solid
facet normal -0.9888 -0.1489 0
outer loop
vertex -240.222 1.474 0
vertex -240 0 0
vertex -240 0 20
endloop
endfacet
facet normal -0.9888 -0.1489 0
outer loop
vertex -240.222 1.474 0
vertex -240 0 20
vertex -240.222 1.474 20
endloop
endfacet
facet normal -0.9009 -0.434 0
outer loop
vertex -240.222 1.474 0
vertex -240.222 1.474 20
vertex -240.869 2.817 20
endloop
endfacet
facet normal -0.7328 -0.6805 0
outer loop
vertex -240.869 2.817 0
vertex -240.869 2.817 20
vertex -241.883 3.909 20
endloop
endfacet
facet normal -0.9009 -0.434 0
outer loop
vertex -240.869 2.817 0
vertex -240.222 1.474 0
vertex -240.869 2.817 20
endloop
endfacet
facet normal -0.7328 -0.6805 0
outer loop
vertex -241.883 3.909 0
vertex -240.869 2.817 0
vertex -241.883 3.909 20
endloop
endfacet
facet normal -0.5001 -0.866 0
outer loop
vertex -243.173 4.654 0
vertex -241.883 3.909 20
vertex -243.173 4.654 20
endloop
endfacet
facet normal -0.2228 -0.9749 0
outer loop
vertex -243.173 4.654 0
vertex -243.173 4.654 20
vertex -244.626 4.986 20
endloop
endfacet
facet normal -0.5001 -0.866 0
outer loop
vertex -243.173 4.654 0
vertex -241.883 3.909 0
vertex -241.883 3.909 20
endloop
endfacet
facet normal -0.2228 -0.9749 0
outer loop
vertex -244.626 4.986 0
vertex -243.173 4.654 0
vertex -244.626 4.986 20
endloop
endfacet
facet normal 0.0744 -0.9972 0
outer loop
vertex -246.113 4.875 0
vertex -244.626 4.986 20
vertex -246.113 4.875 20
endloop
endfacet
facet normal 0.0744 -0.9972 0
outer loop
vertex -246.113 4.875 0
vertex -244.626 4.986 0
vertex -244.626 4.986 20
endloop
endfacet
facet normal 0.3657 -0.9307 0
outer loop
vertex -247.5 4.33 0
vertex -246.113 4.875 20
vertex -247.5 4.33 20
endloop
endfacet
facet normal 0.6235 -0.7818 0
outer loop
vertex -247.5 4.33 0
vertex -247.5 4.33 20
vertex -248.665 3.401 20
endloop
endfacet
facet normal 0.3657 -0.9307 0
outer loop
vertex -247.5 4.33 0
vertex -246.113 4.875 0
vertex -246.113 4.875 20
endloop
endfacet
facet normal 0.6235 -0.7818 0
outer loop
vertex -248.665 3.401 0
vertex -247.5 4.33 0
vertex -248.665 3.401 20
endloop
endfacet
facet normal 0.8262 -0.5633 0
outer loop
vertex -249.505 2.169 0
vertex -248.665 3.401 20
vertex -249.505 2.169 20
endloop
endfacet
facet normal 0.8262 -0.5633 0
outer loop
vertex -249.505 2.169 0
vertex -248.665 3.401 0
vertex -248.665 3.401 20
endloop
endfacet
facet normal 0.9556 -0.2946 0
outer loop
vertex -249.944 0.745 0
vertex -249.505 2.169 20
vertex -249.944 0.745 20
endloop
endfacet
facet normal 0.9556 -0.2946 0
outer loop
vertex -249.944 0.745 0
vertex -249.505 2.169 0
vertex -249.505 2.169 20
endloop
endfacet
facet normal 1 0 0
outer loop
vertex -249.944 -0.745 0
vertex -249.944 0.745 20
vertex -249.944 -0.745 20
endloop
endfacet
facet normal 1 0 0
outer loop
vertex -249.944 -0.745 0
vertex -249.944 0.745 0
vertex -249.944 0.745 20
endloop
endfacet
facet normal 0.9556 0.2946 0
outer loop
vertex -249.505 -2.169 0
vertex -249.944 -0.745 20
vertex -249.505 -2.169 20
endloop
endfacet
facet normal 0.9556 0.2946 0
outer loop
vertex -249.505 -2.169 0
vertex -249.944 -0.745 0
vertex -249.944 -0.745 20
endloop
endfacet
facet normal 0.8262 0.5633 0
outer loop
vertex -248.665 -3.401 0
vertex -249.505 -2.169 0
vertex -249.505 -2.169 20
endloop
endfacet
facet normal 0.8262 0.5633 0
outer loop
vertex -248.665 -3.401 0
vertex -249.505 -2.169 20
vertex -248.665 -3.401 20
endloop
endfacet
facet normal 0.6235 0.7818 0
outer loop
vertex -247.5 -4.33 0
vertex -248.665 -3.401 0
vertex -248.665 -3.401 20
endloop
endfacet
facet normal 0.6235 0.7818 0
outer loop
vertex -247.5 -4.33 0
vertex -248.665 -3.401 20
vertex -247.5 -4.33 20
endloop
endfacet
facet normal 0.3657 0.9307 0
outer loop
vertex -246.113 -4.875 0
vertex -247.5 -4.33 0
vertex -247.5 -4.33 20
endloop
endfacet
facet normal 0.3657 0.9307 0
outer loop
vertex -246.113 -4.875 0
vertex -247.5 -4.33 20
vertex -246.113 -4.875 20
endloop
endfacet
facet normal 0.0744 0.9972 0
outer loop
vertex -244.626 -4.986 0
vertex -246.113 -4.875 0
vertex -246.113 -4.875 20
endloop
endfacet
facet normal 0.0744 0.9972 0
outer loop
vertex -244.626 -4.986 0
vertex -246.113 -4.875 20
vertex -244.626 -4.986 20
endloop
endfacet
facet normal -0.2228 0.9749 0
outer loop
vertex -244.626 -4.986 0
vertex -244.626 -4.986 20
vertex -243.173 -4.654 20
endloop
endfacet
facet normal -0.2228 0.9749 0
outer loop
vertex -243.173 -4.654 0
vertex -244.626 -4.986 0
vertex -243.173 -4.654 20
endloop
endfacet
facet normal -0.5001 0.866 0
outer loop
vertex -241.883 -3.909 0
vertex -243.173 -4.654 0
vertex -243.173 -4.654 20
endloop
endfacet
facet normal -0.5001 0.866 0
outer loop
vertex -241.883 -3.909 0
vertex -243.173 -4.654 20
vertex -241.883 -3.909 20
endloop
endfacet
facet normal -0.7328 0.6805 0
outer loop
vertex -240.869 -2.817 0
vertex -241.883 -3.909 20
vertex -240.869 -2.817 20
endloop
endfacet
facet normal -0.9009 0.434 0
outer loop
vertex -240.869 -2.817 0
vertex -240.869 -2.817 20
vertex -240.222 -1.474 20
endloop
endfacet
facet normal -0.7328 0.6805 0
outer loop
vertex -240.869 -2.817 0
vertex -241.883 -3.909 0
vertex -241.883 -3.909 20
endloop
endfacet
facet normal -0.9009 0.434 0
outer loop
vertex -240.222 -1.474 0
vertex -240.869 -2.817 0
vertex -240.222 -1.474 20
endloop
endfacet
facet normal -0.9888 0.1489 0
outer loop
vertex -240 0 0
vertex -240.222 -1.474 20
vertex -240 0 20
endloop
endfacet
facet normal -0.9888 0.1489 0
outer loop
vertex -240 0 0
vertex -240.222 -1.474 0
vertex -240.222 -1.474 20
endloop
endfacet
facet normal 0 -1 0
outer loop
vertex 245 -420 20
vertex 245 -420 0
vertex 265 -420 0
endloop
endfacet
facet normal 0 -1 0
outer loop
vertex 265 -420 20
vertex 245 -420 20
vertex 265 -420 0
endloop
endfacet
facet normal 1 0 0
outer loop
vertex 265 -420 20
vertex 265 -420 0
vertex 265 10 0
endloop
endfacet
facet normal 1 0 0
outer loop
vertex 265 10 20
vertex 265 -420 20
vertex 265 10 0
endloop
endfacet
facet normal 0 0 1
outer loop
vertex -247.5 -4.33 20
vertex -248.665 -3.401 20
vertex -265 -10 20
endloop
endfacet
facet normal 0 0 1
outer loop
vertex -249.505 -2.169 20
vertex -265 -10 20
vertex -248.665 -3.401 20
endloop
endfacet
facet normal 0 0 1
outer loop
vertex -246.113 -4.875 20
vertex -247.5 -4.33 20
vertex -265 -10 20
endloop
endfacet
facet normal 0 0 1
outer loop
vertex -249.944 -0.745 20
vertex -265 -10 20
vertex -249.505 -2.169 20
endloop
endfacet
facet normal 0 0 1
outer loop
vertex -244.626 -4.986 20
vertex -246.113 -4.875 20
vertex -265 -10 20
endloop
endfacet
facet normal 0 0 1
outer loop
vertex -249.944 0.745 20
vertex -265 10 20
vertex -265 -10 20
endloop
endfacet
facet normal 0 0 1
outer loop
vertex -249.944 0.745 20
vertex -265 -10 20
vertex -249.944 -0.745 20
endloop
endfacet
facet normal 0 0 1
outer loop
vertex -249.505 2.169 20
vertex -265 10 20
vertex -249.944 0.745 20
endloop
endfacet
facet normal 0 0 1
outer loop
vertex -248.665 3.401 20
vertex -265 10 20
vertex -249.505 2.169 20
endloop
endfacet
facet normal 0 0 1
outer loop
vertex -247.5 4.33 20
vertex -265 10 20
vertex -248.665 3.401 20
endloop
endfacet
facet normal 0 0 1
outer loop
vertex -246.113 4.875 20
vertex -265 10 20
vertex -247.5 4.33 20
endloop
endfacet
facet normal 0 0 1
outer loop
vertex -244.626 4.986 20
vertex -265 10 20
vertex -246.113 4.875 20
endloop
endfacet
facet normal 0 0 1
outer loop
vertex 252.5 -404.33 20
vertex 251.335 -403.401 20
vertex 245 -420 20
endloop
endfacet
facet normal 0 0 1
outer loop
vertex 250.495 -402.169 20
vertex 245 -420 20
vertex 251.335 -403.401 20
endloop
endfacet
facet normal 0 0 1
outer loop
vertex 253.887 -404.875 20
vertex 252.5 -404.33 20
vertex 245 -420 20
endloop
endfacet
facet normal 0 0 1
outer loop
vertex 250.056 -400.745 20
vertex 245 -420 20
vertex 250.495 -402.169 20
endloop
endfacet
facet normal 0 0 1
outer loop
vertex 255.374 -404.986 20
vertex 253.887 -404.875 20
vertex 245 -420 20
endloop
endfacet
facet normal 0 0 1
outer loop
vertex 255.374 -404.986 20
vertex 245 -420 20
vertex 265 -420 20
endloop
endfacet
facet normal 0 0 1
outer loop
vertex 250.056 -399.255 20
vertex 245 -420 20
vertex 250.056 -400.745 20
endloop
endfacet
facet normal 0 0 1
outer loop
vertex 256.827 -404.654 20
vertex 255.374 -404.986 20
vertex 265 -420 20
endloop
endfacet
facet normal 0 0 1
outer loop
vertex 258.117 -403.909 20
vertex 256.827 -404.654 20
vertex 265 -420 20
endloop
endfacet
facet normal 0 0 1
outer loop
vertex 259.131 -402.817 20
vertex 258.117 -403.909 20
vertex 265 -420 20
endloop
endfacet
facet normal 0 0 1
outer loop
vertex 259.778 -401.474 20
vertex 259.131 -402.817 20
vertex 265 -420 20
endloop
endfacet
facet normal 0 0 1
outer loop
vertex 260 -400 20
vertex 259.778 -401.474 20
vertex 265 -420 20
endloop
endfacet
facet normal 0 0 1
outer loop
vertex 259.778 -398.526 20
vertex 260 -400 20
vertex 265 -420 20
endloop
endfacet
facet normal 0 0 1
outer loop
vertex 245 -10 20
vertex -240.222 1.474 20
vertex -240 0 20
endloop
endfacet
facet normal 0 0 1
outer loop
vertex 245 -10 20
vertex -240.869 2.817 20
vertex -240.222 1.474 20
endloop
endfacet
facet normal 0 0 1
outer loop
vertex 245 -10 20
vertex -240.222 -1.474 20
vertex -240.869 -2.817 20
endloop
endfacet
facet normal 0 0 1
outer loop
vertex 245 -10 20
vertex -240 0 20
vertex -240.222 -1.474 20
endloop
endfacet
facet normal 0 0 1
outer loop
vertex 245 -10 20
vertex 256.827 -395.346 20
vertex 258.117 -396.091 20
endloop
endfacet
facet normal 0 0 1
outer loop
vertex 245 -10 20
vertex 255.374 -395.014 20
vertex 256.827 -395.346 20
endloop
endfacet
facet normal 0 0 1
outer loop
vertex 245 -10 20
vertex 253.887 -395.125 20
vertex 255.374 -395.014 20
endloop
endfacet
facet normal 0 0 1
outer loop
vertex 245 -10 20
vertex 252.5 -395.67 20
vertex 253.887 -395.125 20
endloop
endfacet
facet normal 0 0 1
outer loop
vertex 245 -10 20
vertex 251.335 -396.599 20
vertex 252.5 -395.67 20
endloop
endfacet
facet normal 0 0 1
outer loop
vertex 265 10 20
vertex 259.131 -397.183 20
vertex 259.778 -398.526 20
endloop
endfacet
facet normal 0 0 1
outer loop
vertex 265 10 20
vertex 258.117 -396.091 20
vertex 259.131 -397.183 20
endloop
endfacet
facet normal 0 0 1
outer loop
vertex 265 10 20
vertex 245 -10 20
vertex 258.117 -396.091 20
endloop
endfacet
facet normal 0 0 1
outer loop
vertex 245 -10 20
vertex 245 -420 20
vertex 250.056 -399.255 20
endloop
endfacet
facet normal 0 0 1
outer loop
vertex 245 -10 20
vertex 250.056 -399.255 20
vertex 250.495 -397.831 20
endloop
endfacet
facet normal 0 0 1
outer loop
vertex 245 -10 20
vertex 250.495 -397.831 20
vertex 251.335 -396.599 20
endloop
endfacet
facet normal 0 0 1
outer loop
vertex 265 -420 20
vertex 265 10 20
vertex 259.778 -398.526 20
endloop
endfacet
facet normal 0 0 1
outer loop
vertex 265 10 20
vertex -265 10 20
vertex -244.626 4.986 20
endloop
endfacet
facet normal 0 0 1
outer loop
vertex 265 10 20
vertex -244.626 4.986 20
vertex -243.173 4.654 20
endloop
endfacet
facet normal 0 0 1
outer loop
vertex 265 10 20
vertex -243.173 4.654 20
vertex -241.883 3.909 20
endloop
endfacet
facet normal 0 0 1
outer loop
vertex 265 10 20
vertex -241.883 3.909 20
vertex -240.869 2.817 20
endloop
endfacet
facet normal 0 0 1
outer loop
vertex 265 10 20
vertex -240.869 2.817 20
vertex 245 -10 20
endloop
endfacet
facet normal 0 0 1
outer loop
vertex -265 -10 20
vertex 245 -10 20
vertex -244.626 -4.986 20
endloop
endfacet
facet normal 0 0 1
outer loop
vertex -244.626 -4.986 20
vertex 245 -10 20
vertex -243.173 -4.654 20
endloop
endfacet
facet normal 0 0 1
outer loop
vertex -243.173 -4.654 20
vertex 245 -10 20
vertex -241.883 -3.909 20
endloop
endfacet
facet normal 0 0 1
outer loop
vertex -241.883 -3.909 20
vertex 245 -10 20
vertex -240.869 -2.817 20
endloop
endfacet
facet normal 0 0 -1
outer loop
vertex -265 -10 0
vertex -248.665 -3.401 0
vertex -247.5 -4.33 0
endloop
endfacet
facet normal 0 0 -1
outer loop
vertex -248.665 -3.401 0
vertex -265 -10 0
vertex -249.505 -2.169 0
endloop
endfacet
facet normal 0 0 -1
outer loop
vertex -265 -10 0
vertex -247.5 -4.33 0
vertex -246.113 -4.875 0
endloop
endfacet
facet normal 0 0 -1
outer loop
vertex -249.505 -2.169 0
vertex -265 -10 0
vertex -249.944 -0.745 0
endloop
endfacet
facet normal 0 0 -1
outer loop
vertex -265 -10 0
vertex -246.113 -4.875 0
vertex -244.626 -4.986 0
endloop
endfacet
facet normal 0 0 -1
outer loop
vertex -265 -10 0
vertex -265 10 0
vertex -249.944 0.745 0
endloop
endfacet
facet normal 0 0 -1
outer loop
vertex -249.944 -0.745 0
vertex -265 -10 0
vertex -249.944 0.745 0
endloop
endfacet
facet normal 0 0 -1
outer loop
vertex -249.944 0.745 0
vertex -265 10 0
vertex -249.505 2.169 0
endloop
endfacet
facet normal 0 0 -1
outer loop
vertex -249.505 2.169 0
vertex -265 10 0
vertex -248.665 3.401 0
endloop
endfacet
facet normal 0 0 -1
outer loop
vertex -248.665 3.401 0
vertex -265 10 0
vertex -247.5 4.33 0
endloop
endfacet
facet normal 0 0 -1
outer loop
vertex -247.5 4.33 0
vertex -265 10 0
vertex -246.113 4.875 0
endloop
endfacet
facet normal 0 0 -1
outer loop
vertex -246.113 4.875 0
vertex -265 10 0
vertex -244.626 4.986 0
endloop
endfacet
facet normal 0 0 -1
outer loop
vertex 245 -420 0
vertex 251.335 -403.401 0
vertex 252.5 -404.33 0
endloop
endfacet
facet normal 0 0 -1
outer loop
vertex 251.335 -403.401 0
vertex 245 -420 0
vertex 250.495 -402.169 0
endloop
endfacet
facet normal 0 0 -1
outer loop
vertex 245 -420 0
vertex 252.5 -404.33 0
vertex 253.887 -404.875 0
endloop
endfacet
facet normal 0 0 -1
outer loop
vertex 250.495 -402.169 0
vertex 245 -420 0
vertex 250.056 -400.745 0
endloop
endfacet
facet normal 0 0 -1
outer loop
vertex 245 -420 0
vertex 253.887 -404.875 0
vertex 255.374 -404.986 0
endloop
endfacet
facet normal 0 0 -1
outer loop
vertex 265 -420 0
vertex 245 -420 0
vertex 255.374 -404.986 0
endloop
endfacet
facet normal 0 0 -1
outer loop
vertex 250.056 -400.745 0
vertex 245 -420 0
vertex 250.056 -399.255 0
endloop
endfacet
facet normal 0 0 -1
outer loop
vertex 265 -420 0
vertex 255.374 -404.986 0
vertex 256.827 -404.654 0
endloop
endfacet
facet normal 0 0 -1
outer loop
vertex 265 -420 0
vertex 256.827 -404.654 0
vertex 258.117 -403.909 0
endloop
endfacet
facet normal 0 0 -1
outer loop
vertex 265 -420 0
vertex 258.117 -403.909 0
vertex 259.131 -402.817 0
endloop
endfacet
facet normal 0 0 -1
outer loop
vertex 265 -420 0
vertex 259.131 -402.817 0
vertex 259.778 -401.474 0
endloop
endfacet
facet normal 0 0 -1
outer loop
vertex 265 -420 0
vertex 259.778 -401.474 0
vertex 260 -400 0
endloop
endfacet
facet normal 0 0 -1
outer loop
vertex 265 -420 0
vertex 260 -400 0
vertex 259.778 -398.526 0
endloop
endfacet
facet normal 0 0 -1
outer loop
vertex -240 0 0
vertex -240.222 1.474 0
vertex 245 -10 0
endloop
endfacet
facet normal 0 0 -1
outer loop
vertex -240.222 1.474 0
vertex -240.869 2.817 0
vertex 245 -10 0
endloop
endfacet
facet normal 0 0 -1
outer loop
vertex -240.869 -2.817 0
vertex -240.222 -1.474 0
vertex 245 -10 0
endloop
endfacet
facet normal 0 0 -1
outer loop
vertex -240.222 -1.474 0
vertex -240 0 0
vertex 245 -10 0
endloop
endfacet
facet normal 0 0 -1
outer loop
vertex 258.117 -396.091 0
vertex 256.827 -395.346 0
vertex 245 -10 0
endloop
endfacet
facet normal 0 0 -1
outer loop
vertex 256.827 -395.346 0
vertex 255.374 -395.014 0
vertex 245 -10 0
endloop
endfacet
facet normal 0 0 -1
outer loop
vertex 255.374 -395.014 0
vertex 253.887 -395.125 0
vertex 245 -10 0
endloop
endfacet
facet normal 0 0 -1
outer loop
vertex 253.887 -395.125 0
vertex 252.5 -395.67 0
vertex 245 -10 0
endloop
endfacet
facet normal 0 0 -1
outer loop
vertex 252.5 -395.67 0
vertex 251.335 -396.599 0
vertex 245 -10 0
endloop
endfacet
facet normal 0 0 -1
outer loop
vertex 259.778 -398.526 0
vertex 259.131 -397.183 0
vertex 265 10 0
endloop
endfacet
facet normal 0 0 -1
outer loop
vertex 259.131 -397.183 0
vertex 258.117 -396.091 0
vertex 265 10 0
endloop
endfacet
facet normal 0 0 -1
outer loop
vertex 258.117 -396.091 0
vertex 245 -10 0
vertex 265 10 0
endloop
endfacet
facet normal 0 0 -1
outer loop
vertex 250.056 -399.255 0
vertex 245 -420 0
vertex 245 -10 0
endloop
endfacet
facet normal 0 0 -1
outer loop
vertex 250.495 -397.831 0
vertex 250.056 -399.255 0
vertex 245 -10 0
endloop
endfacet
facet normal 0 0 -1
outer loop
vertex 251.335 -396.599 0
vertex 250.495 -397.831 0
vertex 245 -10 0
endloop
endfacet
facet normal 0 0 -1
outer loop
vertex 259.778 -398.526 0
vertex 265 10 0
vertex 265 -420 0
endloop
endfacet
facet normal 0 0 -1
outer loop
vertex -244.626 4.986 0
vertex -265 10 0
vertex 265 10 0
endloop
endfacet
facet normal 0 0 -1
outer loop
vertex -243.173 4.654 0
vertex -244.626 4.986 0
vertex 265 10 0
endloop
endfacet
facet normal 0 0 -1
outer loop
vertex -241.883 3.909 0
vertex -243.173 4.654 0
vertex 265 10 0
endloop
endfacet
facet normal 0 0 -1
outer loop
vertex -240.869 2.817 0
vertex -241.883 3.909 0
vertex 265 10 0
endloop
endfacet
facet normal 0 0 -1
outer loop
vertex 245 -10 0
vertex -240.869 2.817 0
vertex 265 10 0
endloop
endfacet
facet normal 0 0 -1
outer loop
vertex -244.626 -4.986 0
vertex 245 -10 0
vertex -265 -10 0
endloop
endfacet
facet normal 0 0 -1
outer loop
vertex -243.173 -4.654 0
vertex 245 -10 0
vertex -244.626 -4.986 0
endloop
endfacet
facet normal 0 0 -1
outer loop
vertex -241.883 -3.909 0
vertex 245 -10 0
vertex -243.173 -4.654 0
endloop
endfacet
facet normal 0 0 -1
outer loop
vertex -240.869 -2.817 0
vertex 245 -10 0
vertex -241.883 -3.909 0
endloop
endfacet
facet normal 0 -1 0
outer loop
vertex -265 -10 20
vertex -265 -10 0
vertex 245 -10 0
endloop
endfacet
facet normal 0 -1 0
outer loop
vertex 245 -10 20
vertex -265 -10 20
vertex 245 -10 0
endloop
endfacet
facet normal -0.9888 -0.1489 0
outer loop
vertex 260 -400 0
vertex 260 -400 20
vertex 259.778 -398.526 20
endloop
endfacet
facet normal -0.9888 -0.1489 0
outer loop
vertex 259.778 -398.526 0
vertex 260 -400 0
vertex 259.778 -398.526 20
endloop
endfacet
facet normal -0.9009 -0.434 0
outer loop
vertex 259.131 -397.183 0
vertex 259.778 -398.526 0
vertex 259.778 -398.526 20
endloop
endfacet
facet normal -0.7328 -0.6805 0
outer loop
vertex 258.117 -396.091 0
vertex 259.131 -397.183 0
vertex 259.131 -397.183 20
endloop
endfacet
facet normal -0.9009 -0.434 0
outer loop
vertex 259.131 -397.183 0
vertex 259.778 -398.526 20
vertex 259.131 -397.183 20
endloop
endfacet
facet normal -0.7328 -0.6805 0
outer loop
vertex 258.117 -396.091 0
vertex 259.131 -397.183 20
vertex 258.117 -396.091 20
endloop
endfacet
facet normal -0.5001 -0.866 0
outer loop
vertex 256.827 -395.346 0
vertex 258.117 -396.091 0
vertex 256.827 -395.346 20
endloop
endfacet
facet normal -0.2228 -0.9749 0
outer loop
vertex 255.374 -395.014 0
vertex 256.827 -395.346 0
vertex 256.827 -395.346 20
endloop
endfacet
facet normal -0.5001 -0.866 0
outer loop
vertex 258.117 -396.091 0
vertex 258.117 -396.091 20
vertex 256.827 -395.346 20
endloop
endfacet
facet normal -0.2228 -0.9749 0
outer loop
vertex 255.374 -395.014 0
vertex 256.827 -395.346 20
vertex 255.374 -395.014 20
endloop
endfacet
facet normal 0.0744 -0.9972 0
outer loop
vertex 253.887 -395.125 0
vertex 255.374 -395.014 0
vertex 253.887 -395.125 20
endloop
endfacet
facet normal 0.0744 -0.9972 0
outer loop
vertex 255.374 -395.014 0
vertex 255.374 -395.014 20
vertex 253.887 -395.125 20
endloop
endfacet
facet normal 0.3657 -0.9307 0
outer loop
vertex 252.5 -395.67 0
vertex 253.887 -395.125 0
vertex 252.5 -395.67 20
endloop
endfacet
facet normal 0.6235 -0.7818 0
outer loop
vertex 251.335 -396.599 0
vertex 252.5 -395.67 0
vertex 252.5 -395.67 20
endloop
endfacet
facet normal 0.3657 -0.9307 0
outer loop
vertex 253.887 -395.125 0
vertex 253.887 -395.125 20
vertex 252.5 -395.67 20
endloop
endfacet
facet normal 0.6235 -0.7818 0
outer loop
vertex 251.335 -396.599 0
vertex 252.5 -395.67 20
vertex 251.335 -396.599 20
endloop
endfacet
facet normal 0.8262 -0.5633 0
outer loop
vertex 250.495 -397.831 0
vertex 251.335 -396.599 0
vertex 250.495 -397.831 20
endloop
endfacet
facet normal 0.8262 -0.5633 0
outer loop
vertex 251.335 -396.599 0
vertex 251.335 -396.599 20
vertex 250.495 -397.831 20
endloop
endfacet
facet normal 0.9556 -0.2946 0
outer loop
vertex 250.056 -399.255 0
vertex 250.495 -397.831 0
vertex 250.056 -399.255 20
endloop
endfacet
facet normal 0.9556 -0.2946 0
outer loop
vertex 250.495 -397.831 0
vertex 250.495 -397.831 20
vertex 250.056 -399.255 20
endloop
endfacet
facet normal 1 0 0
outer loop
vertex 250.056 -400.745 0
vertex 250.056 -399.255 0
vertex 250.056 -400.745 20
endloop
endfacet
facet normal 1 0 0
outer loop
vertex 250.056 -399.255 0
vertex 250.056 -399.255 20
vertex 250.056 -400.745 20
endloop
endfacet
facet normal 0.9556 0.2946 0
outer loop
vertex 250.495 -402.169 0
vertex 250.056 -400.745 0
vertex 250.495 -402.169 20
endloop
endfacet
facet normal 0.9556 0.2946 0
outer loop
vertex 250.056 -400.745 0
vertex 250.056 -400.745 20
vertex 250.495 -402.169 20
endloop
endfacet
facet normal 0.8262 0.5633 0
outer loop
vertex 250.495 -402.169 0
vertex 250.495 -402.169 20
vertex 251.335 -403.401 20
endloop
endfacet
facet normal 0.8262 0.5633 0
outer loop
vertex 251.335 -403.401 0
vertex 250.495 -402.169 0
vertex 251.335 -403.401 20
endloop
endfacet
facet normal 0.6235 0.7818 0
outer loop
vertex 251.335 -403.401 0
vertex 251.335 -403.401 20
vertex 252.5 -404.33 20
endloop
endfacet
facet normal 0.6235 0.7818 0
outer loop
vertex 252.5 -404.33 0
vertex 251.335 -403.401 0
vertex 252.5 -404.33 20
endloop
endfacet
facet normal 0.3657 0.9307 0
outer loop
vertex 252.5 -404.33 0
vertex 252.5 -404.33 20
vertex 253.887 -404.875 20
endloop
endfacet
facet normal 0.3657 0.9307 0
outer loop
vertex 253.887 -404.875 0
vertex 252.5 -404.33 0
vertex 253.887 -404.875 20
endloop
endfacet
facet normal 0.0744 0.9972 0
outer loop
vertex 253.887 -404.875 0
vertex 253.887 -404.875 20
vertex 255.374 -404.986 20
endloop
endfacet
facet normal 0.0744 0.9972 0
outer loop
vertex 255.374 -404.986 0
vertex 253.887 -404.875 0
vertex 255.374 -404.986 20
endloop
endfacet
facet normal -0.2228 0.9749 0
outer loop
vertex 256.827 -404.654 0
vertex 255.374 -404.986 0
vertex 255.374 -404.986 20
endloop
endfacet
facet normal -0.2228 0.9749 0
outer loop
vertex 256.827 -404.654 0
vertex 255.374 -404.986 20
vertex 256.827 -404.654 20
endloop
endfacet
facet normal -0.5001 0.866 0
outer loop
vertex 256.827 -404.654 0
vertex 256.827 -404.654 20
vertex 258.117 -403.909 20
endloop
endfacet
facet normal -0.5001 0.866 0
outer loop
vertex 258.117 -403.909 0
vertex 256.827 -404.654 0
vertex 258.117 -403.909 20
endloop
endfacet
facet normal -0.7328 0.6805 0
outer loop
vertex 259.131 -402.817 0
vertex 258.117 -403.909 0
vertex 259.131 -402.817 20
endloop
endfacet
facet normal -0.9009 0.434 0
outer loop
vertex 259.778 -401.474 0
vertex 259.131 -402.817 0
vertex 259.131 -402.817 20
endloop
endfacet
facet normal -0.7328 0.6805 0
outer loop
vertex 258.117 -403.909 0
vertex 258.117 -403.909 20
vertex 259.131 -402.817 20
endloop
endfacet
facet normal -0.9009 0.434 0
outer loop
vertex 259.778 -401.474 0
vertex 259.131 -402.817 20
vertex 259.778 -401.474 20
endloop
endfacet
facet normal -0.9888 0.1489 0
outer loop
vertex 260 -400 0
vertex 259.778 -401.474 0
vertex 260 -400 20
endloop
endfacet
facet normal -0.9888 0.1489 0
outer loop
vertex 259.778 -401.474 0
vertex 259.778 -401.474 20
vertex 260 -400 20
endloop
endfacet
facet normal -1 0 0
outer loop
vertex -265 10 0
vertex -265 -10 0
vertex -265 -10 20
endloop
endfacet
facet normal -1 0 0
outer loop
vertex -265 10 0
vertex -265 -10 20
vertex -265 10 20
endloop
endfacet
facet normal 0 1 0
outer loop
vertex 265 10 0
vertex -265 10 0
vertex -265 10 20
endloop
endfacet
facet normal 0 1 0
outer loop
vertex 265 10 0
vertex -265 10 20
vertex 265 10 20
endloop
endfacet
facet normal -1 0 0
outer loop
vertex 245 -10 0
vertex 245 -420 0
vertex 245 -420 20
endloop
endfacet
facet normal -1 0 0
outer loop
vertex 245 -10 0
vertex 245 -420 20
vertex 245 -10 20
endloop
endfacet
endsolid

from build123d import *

# Parameters (mm, degrees)
SKETCH_1_W          = 510
SKETCH_1_H          = 20
SKETCH_1_R          = 5
SKETCH_1_W_2        = 20
SKETCH_1_H_2        = 410
EXTRUDE_1_DEPTH     = 20
SKETCH_2_R          = 5
CUT_EXTRUDE_1_DEPTH = 20


with BuildPart() as part:
    # Эскиз1 → Бобышка-Вытянуть1 (new body)
    # profile 1 of 3: a face of its own
    with BuildSketch(Plane.XY):
        with Locations((-10, 0)):
            Rectangle(SKETCH_1_W, SKETCH_1_H)
        with Locations((-245, 0)):
            Circle(SKETCH_1_R, mode=Mode.SUBTRACT)
    # profile 2 of 3: a face of its own
    with BuildSketch(Plane.XY):
        with Locations((255, 0)):
            Rectangle(SKETCH_1_W_2, SKETCH_1_H)
    # profile 3 of 3: a face of its own
    with BuildSketch(Plane.XY):
        with Locations((255, -215)):
            Rectangle(SKETCH_1_W_2, SKETCH_1_H_2)
    extrude(amount=EXTRUDE_1_DEPTH)

    # Эскиз2 → Вырез-Вытянуть1 (cut)
    with BuildSketch(Plane.XY.offset(20)):
        with Locations((255, -400)):
            Circle(SKETCH_2_R)
    extrude(amount=-CUT_EXTRUDE_1_DEPTH, mode=Mode.SUBTRACT)


solid = part.part
